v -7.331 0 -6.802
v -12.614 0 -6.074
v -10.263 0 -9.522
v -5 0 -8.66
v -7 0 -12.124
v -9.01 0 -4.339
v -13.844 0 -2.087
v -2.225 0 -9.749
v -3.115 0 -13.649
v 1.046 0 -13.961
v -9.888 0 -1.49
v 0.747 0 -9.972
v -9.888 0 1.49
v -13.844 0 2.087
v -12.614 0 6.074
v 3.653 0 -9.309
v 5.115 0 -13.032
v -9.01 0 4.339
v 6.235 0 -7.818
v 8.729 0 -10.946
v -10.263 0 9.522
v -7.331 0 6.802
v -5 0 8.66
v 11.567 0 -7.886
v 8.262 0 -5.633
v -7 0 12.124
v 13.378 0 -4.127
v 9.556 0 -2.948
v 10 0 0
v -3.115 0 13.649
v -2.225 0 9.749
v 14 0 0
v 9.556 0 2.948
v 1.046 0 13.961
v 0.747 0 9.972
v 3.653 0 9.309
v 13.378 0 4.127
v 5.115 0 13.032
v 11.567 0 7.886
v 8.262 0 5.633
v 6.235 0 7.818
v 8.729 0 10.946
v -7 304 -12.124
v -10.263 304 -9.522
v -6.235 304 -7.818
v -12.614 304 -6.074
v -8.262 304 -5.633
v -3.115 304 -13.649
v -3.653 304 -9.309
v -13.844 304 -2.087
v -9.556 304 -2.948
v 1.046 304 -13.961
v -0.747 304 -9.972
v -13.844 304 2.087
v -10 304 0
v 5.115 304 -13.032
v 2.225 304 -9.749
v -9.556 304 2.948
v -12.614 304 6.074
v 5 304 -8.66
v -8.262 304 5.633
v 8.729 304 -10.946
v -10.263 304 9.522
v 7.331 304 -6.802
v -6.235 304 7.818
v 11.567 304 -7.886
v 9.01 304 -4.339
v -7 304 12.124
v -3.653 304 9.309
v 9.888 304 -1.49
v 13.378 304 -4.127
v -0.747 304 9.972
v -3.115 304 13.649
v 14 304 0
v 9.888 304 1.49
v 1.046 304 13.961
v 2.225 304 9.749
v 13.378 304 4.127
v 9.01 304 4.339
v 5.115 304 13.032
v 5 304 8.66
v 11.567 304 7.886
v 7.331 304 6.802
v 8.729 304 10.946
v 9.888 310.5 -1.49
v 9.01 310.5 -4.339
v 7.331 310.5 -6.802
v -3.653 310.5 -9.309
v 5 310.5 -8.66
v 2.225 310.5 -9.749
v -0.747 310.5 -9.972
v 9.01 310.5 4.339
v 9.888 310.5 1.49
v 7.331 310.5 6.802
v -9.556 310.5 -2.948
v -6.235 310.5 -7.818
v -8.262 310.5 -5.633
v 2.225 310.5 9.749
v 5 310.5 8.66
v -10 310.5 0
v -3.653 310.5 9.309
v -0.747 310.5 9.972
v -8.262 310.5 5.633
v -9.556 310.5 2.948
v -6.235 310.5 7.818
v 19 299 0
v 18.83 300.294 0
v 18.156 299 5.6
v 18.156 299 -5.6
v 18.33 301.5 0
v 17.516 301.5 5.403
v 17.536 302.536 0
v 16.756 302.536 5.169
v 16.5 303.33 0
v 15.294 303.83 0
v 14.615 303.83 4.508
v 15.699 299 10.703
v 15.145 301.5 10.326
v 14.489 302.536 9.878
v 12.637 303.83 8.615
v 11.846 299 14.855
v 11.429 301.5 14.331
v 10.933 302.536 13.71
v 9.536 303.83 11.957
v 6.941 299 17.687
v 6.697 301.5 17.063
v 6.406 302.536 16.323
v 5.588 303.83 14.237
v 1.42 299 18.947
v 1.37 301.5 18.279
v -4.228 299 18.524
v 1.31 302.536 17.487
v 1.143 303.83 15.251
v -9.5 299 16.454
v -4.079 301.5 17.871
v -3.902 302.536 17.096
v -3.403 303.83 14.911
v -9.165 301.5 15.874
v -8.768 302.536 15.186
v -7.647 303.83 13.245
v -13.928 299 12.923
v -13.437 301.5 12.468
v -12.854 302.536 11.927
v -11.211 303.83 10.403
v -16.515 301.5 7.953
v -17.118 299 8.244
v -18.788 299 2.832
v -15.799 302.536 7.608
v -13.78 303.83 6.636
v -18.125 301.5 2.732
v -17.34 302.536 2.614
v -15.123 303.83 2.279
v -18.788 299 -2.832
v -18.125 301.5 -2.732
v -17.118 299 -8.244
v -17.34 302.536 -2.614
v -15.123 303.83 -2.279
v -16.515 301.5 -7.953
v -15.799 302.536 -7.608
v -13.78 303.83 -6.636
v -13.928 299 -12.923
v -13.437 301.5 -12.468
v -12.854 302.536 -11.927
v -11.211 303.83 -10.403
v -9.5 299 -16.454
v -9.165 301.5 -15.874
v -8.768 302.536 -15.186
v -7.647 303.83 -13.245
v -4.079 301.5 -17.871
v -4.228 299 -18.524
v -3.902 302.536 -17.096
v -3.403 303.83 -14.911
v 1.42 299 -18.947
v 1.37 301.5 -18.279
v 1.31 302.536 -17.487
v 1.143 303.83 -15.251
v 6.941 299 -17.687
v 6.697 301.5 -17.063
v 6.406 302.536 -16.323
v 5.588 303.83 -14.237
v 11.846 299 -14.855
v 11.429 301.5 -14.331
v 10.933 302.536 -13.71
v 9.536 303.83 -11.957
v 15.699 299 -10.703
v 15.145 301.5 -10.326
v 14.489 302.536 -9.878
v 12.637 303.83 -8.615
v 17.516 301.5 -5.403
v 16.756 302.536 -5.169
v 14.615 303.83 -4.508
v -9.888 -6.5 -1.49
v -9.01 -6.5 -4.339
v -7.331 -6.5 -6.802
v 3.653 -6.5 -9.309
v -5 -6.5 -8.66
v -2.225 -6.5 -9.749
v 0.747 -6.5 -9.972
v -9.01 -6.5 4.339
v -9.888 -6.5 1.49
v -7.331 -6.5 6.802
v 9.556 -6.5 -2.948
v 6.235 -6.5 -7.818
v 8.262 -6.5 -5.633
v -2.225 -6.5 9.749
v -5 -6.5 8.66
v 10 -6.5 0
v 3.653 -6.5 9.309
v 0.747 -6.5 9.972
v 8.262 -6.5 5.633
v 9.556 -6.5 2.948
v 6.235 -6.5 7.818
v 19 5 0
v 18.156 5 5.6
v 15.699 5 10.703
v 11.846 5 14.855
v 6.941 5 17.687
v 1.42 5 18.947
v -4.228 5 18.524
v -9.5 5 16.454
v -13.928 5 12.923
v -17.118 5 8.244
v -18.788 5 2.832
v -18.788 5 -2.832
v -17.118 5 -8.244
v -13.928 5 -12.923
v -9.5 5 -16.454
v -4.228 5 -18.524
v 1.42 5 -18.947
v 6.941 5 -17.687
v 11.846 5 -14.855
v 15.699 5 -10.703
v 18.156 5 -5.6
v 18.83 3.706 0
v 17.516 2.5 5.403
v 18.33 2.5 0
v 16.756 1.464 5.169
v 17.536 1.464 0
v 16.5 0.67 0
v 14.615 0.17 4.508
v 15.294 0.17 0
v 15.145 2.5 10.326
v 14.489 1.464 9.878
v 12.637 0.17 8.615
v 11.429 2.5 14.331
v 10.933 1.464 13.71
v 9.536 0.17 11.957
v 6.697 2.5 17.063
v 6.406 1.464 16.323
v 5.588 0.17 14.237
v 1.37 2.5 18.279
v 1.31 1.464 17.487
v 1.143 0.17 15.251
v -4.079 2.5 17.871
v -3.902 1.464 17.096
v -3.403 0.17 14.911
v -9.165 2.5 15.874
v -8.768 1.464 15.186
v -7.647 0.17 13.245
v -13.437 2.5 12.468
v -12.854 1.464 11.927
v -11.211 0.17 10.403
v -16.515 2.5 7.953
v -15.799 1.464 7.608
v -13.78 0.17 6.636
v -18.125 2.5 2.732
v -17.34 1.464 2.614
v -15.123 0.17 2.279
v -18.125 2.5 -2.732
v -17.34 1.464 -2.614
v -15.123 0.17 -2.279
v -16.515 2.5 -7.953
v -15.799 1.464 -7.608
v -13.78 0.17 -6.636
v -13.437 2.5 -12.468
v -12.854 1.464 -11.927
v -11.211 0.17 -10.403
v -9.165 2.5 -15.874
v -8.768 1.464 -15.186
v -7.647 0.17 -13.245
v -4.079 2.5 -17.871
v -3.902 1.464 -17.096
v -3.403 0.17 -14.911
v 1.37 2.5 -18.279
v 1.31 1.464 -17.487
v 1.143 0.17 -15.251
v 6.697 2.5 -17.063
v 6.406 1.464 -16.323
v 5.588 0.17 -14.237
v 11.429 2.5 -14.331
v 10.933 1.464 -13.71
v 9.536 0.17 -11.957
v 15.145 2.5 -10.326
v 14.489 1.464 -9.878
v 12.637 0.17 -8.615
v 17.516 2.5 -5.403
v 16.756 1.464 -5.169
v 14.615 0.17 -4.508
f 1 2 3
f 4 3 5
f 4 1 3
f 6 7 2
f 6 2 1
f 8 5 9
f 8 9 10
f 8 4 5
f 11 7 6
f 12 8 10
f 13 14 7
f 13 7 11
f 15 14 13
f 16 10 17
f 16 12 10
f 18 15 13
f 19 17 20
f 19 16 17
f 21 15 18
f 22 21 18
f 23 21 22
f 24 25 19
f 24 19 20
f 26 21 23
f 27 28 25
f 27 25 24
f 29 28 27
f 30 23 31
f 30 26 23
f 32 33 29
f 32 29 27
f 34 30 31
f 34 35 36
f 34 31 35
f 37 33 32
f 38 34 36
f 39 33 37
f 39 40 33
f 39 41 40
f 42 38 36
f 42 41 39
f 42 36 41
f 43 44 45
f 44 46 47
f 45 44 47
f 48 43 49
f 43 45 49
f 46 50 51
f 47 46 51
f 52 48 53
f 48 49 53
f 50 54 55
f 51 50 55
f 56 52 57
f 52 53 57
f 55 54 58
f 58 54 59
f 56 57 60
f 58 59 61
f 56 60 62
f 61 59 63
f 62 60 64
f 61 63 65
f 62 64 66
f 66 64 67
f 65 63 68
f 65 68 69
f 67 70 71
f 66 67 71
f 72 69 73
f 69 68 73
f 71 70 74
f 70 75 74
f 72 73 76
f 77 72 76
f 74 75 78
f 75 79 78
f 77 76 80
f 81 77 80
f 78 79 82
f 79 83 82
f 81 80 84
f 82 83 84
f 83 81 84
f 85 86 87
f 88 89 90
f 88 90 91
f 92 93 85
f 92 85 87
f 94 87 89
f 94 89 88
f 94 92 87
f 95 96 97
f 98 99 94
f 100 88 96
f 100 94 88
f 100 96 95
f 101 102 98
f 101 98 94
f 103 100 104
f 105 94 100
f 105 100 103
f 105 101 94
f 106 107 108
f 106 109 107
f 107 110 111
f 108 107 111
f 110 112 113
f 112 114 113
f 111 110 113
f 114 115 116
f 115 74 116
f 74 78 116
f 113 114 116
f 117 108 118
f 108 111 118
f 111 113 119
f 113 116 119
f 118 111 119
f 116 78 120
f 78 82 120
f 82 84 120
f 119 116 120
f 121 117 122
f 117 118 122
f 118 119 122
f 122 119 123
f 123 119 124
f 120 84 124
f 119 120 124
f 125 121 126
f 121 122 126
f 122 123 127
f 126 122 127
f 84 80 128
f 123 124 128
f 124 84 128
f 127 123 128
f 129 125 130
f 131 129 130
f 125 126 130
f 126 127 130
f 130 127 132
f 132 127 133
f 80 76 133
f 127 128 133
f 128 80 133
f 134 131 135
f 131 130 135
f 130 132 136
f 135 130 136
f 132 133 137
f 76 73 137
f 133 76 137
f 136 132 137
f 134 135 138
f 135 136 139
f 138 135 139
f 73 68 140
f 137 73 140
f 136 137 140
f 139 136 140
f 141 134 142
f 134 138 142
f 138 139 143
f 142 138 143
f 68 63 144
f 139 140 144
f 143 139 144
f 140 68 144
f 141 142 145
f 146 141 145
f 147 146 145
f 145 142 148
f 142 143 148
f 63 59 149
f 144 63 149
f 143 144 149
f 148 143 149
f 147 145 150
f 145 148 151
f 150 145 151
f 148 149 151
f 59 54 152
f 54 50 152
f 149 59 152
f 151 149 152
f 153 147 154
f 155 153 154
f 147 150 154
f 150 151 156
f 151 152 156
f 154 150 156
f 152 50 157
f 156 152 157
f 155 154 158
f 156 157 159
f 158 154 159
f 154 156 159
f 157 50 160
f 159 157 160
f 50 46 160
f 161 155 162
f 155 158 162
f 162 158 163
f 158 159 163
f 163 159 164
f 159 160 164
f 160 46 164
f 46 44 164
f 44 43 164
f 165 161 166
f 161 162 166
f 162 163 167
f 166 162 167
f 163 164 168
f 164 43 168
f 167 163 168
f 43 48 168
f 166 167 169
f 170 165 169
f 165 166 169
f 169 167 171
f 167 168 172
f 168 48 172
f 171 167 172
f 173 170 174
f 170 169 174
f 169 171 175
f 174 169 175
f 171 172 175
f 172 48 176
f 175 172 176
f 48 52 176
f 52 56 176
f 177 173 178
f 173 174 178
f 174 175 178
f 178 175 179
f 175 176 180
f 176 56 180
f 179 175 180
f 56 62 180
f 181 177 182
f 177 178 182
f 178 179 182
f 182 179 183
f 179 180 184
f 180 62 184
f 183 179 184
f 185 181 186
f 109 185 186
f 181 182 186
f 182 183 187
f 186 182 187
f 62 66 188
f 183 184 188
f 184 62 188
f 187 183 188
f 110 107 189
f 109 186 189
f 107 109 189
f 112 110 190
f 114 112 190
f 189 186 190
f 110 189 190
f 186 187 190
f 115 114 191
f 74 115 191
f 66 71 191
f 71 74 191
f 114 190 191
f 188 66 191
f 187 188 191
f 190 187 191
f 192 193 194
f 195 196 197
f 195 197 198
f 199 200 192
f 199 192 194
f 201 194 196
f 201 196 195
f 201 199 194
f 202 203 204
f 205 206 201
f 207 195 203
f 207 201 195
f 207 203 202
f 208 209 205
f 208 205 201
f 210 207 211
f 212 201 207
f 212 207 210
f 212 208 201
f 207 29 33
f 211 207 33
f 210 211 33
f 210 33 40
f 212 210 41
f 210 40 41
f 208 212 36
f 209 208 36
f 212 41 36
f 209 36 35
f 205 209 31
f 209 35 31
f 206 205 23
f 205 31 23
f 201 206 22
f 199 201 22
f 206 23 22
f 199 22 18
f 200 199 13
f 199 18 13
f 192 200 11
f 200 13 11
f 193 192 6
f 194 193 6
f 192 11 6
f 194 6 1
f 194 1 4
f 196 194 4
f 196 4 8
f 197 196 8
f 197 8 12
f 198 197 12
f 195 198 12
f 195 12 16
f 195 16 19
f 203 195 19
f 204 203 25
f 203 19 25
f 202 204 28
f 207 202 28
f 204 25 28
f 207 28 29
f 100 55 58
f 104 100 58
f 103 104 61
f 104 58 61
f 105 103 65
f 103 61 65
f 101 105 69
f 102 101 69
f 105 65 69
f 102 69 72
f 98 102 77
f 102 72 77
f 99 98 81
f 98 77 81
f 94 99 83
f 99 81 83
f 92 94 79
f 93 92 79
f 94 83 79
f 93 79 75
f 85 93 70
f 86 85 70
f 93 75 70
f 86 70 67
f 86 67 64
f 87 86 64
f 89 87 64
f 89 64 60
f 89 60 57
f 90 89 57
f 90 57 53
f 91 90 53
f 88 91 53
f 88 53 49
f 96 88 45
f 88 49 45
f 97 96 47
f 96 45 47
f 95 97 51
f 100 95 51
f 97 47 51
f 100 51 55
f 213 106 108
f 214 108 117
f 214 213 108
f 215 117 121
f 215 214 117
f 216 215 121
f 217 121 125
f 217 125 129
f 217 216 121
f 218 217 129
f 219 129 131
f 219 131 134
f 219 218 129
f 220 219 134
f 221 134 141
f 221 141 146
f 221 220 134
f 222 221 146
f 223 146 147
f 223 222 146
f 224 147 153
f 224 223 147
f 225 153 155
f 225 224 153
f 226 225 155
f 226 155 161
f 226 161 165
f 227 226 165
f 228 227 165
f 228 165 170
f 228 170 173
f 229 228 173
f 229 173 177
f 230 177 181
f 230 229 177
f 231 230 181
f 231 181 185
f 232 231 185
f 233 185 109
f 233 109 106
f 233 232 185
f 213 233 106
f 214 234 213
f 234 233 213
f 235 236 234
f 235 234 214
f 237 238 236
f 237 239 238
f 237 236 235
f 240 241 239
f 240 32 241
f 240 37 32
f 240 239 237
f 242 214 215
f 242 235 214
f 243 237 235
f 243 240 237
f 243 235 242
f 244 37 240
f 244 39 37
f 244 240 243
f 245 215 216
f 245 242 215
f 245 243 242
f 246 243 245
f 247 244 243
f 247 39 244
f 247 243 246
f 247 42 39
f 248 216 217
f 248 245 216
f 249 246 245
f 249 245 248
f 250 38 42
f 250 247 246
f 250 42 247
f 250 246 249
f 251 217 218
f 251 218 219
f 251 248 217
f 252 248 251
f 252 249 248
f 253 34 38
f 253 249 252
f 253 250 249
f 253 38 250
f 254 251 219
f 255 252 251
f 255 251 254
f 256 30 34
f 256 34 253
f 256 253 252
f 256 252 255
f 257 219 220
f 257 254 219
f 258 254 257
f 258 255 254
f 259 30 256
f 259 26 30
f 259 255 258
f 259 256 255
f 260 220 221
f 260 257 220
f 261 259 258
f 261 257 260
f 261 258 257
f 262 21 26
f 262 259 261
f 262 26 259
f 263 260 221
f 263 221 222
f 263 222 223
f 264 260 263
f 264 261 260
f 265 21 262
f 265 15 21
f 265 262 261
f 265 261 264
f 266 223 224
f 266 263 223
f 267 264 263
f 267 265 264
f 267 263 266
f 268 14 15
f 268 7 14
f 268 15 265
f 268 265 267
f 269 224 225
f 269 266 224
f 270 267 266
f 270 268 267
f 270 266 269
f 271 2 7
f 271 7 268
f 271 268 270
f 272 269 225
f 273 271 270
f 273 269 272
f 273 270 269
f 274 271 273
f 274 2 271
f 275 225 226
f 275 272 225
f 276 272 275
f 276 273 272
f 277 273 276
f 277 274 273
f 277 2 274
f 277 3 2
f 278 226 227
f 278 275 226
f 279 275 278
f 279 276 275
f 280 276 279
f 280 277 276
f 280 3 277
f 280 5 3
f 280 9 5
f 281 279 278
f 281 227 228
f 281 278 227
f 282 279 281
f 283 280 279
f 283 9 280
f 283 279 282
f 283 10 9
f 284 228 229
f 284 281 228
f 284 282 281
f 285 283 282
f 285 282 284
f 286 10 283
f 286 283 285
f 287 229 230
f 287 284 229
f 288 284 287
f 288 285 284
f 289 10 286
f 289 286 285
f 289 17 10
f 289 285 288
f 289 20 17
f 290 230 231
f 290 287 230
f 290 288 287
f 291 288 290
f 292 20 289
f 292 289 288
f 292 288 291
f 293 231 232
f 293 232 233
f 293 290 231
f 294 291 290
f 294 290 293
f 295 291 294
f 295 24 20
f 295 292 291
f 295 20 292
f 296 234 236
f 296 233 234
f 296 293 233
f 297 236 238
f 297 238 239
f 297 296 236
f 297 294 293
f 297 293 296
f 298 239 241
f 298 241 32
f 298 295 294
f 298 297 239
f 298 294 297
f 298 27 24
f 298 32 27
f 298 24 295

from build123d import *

# Parameters (mm, degrees)
F0_R     = 10
F1_DEPTH = 6.5
F2_R     = 19
F3_DEPTH = 304
F4_R     = 10
F5_DEPTH = 6.5
F7_R     = 5


with BuildPart() as f1:
    # F0 (on Front) → F1 (new body)
    with BuildSketch(Plane.XZ):
        Circle(F0_R)
    extrude(amount=F1_DEPTH)

    # F2 (on Front) → F3 (join)
    with BuildSketch(Plane.XZ):
        Circle(F2_R)
    extrude(amount=-F3_DEPTH)

    # F4 (on face) → F5 (join)
    with BuildSketch(Plane(origin=(0, 304, 0), x_dir=(-1, 0, 0), z_dir=(0, 1, 0))):
        Circle(F4_R)
    extrude(amount=F5_DEPTH)

    # F7
    f7_edges = [f1.edges().sort_by_distance(p)[0] for p in [
        (-19, 304, 0),
        (-19, 0, 0),
    ]]
    fillet(f7_edges, radius=F7_R)


solid = f1.part
